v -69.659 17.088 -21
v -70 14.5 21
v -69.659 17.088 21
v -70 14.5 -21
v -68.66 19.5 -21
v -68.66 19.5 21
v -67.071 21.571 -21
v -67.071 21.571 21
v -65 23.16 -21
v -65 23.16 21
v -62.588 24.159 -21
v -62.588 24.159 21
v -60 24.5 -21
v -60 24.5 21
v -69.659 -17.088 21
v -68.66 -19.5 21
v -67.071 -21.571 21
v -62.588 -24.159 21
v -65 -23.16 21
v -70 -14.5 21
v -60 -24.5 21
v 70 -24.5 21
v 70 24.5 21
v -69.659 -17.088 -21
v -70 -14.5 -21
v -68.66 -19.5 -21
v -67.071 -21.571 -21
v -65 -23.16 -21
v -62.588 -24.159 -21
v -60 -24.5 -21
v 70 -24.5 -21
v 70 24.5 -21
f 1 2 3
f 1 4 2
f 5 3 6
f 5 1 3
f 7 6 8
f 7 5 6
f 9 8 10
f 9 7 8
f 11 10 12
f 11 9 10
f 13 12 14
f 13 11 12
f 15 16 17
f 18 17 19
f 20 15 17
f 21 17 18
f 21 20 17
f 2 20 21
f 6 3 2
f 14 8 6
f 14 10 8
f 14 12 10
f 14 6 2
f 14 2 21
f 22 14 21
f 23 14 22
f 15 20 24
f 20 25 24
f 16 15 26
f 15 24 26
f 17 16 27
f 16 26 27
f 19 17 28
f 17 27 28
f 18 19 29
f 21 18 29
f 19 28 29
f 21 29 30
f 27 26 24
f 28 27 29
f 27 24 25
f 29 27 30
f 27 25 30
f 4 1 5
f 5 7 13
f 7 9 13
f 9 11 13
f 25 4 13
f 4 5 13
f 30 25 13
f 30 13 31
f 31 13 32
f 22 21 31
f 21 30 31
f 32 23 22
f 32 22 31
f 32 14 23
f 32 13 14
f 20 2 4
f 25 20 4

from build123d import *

# Parameters (mm, degrees)
CROQUIS2_W              = 140
CROQUIS2_H              = 42
SALIENTE_EXTRUIR1_DEPTH = 24.5
REDONDEO1_R             = 10


with BuildPart() as part:
    # Croquis2 → Saliente-Extruir1 (new, symmetric)
    with BuildSketch(Plane(origin=(0, 0, 0), x_dir=(1, 0, 0), z_dir=(0, 1, 0))):
        Rectangle(CROQUIS2_W, CROQUIS2_H)
    extrude(amount=SALIENTE_EXTRUIR1_DEPTH, both=True)

    # Redondeo1
    redondeo1_edges = [part.edges().sort_by_distance(p)[0] for p in [
        (-70, 24.5, 0),
        (-70, -24.5, 0),
    ]]
    fillet(redondeo1_edges, radius=REDONDEO1_R)


solid = part.part
